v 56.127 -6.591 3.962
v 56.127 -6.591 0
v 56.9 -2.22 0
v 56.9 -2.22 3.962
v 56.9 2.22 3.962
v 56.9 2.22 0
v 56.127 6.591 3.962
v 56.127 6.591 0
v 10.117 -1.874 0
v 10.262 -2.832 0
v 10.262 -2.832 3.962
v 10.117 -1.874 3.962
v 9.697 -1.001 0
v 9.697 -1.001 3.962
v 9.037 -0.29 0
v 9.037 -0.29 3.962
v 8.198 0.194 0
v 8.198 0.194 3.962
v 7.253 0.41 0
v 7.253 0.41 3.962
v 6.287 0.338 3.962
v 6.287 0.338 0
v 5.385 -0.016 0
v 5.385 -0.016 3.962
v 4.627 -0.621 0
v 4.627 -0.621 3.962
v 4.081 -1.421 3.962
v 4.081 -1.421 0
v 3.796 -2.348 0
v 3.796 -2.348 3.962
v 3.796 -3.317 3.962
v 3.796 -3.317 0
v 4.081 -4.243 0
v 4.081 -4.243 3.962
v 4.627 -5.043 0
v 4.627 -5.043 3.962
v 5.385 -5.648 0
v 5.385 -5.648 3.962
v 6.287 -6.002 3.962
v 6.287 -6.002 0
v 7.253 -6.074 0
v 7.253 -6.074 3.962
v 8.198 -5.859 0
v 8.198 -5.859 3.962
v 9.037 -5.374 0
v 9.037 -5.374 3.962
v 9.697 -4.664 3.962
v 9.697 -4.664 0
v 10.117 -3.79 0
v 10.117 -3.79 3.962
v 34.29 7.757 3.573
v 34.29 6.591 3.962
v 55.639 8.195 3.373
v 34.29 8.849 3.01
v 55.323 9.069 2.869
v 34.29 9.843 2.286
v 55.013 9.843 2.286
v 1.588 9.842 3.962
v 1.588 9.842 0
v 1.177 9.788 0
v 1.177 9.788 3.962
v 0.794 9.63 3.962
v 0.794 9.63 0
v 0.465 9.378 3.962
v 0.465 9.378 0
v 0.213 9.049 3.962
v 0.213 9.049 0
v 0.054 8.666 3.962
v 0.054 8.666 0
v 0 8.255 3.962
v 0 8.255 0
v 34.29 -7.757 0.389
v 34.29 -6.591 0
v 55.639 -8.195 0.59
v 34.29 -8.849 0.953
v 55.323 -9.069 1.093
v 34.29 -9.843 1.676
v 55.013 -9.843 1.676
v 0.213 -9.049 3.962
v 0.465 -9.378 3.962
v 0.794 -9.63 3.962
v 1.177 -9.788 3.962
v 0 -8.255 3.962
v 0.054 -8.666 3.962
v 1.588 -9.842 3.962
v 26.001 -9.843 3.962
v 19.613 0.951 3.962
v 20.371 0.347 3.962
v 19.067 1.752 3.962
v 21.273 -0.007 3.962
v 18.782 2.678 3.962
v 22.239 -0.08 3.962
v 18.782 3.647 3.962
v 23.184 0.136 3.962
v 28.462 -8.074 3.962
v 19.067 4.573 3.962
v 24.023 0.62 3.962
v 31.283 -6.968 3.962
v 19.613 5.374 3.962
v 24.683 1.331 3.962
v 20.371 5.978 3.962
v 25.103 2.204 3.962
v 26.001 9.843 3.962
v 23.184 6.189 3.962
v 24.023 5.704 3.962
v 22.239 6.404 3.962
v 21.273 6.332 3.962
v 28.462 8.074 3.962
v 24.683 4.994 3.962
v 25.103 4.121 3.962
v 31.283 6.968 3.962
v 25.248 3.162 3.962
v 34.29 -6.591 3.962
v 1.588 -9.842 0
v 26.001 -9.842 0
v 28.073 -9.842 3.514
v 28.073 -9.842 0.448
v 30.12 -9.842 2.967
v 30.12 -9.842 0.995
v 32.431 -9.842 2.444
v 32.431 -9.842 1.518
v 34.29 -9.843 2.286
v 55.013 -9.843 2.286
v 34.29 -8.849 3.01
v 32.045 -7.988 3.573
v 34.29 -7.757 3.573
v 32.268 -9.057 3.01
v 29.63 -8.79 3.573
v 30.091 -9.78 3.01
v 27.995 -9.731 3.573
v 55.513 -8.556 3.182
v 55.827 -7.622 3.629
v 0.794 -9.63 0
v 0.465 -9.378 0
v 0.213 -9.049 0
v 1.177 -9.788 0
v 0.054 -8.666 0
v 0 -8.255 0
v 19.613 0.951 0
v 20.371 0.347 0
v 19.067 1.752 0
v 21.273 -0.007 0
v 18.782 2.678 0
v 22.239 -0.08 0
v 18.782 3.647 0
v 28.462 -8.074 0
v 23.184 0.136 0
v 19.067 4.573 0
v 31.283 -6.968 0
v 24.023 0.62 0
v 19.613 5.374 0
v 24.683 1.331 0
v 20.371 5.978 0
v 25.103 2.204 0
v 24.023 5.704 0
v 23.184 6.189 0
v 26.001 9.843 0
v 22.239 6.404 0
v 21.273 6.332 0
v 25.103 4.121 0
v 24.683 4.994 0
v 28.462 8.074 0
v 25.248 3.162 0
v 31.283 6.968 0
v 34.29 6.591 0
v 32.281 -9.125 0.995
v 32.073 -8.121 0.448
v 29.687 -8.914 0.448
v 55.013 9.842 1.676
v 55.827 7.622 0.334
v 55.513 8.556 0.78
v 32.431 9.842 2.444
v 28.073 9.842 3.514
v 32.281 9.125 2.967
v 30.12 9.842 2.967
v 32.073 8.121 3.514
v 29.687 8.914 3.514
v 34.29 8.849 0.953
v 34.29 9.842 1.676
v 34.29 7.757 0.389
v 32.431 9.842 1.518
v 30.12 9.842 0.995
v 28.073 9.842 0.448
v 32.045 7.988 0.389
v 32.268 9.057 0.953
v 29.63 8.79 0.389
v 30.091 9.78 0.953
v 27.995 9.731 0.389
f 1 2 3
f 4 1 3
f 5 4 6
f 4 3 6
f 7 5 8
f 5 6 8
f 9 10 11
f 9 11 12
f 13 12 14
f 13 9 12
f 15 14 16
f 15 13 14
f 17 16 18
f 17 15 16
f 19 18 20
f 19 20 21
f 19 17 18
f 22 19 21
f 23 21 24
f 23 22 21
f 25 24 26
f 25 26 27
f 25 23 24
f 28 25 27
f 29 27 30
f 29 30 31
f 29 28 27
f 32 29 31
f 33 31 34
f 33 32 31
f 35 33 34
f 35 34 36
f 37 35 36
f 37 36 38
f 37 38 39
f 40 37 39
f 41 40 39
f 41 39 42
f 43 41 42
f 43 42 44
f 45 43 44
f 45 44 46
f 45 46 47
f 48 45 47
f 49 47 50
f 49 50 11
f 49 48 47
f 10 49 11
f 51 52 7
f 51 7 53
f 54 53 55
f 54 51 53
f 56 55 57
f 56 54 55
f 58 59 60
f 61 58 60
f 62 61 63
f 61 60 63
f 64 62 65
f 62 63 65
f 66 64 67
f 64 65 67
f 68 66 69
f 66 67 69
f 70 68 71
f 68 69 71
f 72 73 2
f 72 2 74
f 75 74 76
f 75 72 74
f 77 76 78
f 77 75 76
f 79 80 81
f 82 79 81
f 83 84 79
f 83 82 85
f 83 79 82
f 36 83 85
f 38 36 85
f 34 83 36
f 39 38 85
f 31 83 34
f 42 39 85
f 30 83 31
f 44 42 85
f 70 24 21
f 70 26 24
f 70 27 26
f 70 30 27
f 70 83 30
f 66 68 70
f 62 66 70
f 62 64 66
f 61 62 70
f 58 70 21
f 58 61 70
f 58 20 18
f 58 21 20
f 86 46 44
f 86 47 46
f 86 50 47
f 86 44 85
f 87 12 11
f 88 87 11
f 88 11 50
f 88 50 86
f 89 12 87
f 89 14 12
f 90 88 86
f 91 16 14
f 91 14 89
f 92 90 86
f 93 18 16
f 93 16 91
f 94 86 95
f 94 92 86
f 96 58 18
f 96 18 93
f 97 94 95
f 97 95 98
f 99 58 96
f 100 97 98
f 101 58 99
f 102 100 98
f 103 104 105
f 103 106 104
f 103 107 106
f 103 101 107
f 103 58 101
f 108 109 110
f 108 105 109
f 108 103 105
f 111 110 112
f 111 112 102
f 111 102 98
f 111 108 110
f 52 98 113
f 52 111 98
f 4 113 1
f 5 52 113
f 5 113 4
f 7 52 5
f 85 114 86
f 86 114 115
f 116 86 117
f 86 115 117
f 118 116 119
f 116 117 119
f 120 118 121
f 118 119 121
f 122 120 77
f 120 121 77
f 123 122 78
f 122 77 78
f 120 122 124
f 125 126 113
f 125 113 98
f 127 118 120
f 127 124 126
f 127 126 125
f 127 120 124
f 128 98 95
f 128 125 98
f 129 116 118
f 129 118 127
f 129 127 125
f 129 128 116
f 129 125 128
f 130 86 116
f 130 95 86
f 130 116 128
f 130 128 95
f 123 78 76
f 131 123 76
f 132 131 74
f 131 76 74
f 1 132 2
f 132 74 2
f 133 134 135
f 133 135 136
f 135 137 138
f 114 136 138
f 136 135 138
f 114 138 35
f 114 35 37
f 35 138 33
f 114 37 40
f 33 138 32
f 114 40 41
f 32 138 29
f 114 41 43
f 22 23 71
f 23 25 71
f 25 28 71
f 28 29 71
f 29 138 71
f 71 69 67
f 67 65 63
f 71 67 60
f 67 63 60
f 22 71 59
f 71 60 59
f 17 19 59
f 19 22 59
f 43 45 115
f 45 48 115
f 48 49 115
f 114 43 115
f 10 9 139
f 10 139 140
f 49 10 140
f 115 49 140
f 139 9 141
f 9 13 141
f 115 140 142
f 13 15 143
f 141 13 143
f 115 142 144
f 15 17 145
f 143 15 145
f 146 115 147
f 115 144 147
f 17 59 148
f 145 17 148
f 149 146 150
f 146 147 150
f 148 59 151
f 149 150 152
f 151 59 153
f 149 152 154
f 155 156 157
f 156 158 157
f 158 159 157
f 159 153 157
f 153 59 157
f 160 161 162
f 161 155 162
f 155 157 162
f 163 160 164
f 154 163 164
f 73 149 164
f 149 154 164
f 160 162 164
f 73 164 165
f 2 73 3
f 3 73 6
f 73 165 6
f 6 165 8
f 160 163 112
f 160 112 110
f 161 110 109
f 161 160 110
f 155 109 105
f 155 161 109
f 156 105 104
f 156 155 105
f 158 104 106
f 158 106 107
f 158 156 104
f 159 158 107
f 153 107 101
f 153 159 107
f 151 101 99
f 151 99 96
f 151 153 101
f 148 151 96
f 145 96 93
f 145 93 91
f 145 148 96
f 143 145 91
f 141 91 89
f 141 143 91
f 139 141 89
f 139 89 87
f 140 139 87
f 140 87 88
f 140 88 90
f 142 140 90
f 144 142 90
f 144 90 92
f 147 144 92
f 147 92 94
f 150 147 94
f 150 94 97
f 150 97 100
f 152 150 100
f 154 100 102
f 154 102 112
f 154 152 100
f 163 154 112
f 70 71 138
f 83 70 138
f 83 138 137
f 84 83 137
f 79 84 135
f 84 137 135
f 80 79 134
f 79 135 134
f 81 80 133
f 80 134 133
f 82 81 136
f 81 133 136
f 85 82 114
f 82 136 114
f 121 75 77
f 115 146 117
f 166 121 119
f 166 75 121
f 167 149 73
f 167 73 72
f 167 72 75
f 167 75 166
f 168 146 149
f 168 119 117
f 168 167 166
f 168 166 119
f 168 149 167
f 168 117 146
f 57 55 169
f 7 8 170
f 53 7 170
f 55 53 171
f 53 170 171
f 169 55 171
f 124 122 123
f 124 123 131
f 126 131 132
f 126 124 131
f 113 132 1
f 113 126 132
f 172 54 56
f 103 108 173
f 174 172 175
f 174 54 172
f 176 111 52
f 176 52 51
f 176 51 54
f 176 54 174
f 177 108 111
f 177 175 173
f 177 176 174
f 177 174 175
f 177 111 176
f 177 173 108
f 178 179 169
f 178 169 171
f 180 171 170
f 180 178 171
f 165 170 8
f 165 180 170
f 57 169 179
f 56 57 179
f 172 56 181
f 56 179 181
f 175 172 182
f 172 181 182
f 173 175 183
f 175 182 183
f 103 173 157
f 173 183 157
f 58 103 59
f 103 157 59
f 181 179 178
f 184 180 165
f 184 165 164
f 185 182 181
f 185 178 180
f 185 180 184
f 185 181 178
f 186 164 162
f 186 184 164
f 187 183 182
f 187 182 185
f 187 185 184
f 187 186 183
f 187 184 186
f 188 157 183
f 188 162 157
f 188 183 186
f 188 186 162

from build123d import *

# Parameters (mm, degrees)
F0_R     = 3.2512
F1_DEPTH = 3.9624


with BuildPart() as f1:
    # F0 (on Top) → F1 (new body)
    with BuildSketch(Plane.XY):
        with BuildLine():
            ThreePointArc((1.5875, 9.8425), (0.464968, 9.377532), (0, 8.255))
            Line((0, 8.255), (0, -8.255))
            ThreePointArc((0, -8.255), (0.464968, -9.377532), (1.5875, -9.8425))
            Line((1.5875, -9.8425), (26.001034, -9.8425))
            ThreePointArc((26.001034, -9.8425), (29.838111, -7.433166), (34.29, -6.5913))
            Line((34.29, -6.5913), (56.127475, -6.5913))
            ThreePointArc((56.127475, -6.5913), (56.9976, 0), (56.127475, 6.5913))
            Line((56.127475, 6.5913), (34.29, 6.5913))
            ThreePointArc((34.29, 6.5913), (29.838111, 7.433166), (26.001034, 9.8425))
            Line((26.001034, 9.8425), (1.5875, 9.8425))
        make_face()
        with Locations((7.0104, -2.8321)):
            Circle(F0_R, mode=Mode.SUBTRACT)
        with Locations((21.9964, 3.1623)):
            Circle(F0_R, mode=Mode.SUBTRACT)
        with BuildLine():
            Line((55.01309, 9.8425), (26.001034, 9.8425))
            ThreePointArc((26.001034, 9.8425), (29.838111, 7.433166), (34.29, 6.5913))
            Line((34.29, 6.5913), (56.127475, 6.5913))
            ThreePointArc((56.127475, 6.5913), (55.625336, 8.23577), (55.01309, 9.8425))
        make_face()
        with BuildLine():
            ThreePointArc((34.29, -6.5913), (29.838111, -7.433166), (26.001034, -9.8425))
            Line((26.001034, -9.8425), (55.01309, -9.8425))
            ThreePointArc((55.01309, -9.8425), (55.625336, -8.23577), (56.127475, -6.5913))
            Line((56.127475, -6.5913), (34.29, -6.5913))
        make_face()
    extrude(amount=F1_DEPTH)

    # F4: sweep along a path in F0
    with BuildLine(Plane.XY) as f4_path:
        Line((60.852341, 6.5913), (34.29, 6.5913))
        ThreePointArc((34.29, 6.5913), (29.838111, 7.433166), (26.001034, 9.8425))
    # F3 (on offset) → F4 (sweep, cut)
    with BuildSketch(Plane.YZ.offset(56.9976)):
        with BuildLine():
            Line((13.0175, 1.6764), (9.8425, 1.6764))
            ThreePointArc((9.8425, 1.6764), (8.313989, 0.649906), (6.5913, 0))
            Line((6.5913, 0), (6.5913, -3.175))
            Line((6.5913, -3.175), (13.0175, -3.175))
            Line((13.0175, -3.175), (13.0175, 1.6764))
        make_face()
        with BuildLine():
            ThreePointArc((6.5913, 3.9624), (8.313989, 3.312494), (9.8425, 2.286))
            Line((9.8425, 2.286), (13.0175, 2.286))
            Line((13.0175, 2.286), (13.0175, 7.1374))
            Line((13.0175, 7.1374), (6.5913, 7.1374))
            Line((6.5913, 7.1374), (6.5913, 3.9624))
        make_face()
    sweep(path=f4_path.line, mode=Mode.SUBTRACT)

    # F5: sweep along a path in F0
    with BuildLine(Plane.XY) as f5_path:
        Line((60.852341, -6.5913), (34.29, -6.5913))
        ThreePointArc((34.29, -6.5913), (29.838111, -7.433166), (26.001034, -9.8425))
    # F3 (on offset) → F5 (sweep, cut)
    with BuildSketch(Plane.YZ.offset(56.9976)):
        with BuildLine():
            Line((-6.5913, -3.175), (-6.5913, 0))
            ThreePointArc((-6.5913, 0), (-8.313989, 0.649906), (-9.8425, 1.6764))
            Line((-9.8425, 1.6764), (-13.02766, 1.6764))
            Line((-13.02766, 1.6764), (-13.02766, -3.175))
            Line((-13.02766, -3.175), (-6.5913, -3.175))
        make_face()
        with BuildLine():
            ThreePointArc((-9.8425, 2.286), (-8.313989, 3.312494), (-6.5913, 3.9624))
            Line((-6.5913, 3.9624), (-6.5913, 7.1374))
            Line((-6.5913, 7.1374), (-13.02766, 7.1374))
            Line((-13.02766, 7.1374), (-13.02766, 2.286))
            Line((-13.02766, 2.286), (-9.8425, 2.286))
        make_face()
    sweep(path=f5_path.line, mode=Mode.SUBTRACT)


solid = f1.part
